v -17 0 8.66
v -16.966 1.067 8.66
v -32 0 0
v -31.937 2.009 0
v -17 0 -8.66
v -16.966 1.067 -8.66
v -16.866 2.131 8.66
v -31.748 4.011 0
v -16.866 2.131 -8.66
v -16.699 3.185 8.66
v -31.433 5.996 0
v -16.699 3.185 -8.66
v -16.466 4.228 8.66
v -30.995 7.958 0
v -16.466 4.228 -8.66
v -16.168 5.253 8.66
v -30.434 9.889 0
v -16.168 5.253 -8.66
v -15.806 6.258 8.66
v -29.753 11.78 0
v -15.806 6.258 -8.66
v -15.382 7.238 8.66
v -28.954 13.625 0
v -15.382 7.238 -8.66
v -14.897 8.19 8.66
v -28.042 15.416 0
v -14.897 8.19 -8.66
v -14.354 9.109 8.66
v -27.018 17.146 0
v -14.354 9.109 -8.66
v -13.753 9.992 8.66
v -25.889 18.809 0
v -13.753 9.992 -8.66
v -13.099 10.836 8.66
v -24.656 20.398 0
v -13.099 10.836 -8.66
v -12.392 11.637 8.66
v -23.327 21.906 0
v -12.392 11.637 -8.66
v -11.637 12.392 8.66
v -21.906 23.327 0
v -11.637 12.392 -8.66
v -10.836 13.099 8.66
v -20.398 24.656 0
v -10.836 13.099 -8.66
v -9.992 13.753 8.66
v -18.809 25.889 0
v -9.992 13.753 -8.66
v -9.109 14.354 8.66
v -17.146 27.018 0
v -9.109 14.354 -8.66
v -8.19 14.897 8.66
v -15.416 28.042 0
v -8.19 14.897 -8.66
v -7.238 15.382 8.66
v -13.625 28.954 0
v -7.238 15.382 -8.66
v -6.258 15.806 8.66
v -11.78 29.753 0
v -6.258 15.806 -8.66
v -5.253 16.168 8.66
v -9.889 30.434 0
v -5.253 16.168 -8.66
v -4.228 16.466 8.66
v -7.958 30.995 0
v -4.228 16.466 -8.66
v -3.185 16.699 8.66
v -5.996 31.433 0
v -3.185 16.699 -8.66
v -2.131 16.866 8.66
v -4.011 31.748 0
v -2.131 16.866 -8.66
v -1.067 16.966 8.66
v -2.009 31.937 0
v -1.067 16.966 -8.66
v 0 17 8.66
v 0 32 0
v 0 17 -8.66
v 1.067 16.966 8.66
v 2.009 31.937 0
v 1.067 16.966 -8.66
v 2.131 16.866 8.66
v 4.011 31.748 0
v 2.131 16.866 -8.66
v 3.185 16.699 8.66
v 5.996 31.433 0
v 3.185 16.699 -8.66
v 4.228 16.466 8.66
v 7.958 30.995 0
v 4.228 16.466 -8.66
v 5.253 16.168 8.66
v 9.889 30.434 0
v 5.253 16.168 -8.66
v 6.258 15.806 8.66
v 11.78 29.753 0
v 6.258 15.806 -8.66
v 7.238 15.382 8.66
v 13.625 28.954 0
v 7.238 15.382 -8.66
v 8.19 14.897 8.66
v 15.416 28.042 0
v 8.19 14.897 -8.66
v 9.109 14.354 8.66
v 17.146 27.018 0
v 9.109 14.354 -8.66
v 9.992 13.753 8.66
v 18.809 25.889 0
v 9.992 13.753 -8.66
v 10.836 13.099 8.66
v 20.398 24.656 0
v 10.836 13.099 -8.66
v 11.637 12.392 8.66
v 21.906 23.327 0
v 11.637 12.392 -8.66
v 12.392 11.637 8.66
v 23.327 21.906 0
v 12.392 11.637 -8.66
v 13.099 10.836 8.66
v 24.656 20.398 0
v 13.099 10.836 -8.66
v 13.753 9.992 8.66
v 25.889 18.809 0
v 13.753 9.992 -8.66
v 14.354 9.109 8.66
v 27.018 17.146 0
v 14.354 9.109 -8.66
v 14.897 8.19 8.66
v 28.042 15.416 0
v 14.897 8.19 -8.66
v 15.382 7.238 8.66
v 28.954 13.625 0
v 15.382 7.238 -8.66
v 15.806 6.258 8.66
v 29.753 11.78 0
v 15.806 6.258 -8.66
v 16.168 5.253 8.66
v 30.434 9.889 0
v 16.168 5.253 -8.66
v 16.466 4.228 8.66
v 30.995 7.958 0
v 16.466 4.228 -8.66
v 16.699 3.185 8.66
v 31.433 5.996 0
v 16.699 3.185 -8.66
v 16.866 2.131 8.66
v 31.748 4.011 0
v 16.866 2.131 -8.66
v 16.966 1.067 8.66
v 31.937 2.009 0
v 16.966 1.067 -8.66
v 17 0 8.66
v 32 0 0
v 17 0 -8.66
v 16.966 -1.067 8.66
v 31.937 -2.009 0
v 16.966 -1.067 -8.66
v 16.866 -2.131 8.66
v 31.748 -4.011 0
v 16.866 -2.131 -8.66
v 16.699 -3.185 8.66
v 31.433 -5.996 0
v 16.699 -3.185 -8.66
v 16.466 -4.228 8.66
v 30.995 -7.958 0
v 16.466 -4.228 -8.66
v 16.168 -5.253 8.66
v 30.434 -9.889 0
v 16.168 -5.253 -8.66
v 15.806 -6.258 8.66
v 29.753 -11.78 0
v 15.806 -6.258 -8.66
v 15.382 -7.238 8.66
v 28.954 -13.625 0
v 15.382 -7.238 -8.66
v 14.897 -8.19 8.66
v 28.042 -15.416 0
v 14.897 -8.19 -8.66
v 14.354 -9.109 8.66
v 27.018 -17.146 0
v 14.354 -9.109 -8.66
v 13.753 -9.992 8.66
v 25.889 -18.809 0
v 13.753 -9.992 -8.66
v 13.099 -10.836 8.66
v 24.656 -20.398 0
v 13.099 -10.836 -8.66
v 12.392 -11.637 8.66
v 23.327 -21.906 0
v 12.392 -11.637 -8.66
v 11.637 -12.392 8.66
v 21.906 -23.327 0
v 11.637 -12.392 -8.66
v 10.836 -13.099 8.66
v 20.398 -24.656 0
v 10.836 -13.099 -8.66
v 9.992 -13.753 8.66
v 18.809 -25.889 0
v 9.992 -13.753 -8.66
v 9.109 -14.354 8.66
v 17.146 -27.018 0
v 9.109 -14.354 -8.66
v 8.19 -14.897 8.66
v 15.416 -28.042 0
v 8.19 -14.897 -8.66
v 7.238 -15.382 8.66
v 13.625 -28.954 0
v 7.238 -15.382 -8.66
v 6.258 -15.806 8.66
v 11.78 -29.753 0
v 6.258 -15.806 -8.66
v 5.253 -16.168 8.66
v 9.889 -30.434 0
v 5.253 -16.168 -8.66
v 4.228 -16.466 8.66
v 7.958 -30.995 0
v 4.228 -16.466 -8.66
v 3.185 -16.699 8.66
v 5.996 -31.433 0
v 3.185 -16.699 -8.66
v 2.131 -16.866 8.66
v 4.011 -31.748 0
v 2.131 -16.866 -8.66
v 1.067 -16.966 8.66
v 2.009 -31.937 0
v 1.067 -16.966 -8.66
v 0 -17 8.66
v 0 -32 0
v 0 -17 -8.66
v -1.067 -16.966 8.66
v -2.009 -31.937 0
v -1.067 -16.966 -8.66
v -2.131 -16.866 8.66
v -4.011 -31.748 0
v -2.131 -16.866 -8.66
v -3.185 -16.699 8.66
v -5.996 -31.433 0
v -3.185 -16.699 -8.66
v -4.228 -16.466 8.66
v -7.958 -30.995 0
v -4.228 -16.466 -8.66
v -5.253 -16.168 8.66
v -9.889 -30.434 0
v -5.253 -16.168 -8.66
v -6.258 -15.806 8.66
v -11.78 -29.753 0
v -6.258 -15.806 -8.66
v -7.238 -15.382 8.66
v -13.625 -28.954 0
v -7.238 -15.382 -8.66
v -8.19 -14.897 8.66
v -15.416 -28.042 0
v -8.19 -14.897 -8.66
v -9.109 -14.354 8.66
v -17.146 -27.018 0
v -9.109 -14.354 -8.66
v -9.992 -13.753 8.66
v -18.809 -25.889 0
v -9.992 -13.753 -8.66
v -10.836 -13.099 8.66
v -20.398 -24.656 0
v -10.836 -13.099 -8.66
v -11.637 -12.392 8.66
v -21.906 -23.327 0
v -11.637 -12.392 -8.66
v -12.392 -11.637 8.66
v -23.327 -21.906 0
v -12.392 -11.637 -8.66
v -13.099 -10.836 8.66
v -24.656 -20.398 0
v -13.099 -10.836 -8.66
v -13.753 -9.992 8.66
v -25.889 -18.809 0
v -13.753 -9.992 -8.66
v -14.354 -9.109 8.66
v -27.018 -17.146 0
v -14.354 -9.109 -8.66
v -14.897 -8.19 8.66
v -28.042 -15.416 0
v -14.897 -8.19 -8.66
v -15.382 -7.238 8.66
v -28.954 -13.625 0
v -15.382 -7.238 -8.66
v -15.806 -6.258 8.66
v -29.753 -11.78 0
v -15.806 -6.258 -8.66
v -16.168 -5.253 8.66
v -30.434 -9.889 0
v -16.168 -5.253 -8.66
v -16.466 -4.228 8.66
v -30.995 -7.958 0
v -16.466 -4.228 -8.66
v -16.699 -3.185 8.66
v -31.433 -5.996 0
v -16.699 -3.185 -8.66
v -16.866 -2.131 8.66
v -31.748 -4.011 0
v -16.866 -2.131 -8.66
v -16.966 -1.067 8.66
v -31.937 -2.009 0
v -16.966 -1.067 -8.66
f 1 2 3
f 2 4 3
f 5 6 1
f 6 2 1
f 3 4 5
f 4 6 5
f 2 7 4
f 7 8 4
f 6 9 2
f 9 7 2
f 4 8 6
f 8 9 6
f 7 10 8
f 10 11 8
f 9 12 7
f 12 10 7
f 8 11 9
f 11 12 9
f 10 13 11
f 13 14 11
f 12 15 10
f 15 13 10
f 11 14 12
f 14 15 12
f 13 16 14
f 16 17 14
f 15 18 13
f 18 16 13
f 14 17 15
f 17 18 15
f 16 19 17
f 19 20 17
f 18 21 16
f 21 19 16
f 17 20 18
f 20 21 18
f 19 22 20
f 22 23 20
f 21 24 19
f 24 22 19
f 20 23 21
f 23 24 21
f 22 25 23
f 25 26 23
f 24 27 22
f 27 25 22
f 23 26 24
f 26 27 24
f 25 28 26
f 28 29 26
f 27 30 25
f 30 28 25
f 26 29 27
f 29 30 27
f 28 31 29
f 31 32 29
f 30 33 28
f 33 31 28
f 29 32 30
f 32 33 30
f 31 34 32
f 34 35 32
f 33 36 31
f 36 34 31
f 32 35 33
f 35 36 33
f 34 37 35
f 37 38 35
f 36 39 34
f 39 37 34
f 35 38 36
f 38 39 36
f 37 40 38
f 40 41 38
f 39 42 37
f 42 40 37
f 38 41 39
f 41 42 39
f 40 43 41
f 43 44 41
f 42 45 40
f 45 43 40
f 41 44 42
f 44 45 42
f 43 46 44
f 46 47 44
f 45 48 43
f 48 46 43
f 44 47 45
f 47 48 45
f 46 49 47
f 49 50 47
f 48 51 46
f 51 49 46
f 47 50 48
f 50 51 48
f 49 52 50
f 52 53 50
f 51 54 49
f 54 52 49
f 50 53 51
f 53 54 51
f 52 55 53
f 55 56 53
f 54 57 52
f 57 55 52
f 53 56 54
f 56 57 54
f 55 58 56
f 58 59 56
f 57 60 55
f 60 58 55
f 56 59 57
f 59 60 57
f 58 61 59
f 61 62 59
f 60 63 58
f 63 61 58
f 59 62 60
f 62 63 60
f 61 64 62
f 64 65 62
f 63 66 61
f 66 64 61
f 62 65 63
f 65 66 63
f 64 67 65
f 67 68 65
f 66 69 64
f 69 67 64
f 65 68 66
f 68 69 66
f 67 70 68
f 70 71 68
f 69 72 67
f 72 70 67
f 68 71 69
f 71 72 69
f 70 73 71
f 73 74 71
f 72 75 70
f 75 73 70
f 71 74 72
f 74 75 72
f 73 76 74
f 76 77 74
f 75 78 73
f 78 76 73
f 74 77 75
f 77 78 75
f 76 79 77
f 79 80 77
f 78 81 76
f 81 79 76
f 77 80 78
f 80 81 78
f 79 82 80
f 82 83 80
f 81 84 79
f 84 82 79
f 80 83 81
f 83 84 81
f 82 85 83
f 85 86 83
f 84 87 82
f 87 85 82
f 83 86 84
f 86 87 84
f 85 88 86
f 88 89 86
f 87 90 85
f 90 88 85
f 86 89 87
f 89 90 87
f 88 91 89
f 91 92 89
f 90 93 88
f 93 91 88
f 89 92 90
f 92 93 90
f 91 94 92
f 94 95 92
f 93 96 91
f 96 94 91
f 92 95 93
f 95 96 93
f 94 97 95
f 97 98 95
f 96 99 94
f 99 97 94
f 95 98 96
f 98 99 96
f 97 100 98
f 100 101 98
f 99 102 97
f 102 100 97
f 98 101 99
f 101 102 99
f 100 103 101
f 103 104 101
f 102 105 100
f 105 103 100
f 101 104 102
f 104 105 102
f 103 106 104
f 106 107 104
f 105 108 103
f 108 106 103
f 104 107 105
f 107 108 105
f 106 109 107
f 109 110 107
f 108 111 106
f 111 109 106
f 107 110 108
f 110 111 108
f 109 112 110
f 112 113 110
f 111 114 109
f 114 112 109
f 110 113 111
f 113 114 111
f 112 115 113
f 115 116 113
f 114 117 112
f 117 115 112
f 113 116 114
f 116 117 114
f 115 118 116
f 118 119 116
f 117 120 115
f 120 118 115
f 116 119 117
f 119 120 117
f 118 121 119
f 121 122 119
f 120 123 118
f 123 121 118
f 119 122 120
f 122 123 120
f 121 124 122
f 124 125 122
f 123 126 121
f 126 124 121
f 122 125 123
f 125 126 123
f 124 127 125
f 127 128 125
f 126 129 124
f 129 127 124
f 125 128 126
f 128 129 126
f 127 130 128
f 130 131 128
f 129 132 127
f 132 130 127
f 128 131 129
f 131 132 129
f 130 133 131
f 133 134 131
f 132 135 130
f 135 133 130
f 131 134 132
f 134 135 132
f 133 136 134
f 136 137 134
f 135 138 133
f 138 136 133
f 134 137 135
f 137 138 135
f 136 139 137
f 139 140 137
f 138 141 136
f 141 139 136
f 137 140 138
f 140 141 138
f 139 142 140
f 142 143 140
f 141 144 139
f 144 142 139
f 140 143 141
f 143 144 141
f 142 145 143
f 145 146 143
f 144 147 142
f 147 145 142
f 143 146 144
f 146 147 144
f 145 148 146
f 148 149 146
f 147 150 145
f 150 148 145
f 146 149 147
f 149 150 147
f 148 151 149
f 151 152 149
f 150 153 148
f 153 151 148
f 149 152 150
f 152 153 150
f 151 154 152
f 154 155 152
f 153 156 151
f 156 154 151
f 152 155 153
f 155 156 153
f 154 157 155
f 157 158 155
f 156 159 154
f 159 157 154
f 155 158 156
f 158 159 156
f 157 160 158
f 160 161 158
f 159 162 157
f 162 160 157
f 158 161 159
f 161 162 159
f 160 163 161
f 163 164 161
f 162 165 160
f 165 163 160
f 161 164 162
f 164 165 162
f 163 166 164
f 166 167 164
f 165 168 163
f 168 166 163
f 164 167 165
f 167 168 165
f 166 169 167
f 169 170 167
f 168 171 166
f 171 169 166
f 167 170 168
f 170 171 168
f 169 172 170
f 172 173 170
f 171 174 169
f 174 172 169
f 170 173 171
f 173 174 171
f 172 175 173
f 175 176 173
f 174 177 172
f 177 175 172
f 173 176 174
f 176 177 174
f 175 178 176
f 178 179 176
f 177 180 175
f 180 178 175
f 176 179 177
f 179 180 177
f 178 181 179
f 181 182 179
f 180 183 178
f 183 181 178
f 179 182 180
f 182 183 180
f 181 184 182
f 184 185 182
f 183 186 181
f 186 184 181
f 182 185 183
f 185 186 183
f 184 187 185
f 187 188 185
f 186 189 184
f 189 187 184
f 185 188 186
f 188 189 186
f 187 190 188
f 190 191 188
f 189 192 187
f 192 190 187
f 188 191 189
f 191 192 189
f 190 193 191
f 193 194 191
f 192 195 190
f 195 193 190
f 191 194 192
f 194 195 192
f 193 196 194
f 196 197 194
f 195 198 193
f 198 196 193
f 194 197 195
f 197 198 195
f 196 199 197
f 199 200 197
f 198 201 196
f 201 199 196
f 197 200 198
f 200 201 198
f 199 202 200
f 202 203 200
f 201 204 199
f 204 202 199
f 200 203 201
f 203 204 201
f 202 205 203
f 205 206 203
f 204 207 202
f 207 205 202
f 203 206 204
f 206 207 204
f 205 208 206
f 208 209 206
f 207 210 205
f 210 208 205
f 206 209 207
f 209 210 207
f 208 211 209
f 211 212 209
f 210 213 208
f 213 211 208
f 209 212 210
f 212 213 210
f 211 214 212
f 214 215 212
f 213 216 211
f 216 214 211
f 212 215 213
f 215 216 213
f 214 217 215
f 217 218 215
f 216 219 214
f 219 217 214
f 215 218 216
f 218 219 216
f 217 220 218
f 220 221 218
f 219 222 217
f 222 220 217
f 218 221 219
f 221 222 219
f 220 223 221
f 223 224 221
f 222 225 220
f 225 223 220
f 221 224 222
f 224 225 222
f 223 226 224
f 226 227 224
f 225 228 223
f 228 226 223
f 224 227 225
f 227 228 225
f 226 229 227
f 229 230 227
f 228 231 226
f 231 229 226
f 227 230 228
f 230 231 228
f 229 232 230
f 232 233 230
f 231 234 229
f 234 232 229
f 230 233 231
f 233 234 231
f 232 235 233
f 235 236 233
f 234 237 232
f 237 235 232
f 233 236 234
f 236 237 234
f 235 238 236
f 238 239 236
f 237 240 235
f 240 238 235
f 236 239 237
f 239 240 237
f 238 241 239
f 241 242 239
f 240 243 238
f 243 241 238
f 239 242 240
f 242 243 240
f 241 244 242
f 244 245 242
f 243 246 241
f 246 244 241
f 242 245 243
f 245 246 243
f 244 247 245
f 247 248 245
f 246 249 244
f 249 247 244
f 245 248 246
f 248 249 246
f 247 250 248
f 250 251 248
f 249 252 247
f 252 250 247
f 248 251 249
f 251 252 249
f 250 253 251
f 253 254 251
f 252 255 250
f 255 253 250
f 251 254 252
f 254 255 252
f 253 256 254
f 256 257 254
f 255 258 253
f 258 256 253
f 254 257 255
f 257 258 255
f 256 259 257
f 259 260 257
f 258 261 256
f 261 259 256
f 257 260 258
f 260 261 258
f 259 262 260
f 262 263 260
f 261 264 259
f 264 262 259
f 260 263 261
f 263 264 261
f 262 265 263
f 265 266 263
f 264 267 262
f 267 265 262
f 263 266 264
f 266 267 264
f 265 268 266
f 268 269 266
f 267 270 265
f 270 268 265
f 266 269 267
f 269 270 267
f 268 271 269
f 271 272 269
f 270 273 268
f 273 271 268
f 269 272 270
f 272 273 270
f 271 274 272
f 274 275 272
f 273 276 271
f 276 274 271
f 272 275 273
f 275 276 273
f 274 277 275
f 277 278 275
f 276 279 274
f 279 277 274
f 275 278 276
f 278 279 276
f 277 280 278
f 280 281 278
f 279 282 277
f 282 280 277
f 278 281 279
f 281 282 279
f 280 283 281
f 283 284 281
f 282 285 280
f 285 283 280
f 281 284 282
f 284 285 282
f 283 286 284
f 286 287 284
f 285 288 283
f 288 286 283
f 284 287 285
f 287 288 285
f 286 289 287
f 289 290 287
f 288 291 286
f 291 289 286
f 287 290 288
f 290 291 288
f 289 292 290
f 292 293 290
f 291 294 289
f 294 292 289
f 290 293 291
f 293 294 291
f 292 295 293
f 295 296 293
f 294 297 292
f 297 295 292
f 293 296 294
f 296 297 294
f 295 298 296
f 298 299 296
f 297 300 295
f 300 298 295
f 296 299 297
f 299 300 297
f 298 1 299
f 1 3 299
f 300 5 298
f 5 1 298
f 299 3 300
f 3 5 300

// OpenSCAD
$fn = 100;
rotate_extrude(convexity = 10) translate([22, 0, 0]) circle(10, $fn=3);
